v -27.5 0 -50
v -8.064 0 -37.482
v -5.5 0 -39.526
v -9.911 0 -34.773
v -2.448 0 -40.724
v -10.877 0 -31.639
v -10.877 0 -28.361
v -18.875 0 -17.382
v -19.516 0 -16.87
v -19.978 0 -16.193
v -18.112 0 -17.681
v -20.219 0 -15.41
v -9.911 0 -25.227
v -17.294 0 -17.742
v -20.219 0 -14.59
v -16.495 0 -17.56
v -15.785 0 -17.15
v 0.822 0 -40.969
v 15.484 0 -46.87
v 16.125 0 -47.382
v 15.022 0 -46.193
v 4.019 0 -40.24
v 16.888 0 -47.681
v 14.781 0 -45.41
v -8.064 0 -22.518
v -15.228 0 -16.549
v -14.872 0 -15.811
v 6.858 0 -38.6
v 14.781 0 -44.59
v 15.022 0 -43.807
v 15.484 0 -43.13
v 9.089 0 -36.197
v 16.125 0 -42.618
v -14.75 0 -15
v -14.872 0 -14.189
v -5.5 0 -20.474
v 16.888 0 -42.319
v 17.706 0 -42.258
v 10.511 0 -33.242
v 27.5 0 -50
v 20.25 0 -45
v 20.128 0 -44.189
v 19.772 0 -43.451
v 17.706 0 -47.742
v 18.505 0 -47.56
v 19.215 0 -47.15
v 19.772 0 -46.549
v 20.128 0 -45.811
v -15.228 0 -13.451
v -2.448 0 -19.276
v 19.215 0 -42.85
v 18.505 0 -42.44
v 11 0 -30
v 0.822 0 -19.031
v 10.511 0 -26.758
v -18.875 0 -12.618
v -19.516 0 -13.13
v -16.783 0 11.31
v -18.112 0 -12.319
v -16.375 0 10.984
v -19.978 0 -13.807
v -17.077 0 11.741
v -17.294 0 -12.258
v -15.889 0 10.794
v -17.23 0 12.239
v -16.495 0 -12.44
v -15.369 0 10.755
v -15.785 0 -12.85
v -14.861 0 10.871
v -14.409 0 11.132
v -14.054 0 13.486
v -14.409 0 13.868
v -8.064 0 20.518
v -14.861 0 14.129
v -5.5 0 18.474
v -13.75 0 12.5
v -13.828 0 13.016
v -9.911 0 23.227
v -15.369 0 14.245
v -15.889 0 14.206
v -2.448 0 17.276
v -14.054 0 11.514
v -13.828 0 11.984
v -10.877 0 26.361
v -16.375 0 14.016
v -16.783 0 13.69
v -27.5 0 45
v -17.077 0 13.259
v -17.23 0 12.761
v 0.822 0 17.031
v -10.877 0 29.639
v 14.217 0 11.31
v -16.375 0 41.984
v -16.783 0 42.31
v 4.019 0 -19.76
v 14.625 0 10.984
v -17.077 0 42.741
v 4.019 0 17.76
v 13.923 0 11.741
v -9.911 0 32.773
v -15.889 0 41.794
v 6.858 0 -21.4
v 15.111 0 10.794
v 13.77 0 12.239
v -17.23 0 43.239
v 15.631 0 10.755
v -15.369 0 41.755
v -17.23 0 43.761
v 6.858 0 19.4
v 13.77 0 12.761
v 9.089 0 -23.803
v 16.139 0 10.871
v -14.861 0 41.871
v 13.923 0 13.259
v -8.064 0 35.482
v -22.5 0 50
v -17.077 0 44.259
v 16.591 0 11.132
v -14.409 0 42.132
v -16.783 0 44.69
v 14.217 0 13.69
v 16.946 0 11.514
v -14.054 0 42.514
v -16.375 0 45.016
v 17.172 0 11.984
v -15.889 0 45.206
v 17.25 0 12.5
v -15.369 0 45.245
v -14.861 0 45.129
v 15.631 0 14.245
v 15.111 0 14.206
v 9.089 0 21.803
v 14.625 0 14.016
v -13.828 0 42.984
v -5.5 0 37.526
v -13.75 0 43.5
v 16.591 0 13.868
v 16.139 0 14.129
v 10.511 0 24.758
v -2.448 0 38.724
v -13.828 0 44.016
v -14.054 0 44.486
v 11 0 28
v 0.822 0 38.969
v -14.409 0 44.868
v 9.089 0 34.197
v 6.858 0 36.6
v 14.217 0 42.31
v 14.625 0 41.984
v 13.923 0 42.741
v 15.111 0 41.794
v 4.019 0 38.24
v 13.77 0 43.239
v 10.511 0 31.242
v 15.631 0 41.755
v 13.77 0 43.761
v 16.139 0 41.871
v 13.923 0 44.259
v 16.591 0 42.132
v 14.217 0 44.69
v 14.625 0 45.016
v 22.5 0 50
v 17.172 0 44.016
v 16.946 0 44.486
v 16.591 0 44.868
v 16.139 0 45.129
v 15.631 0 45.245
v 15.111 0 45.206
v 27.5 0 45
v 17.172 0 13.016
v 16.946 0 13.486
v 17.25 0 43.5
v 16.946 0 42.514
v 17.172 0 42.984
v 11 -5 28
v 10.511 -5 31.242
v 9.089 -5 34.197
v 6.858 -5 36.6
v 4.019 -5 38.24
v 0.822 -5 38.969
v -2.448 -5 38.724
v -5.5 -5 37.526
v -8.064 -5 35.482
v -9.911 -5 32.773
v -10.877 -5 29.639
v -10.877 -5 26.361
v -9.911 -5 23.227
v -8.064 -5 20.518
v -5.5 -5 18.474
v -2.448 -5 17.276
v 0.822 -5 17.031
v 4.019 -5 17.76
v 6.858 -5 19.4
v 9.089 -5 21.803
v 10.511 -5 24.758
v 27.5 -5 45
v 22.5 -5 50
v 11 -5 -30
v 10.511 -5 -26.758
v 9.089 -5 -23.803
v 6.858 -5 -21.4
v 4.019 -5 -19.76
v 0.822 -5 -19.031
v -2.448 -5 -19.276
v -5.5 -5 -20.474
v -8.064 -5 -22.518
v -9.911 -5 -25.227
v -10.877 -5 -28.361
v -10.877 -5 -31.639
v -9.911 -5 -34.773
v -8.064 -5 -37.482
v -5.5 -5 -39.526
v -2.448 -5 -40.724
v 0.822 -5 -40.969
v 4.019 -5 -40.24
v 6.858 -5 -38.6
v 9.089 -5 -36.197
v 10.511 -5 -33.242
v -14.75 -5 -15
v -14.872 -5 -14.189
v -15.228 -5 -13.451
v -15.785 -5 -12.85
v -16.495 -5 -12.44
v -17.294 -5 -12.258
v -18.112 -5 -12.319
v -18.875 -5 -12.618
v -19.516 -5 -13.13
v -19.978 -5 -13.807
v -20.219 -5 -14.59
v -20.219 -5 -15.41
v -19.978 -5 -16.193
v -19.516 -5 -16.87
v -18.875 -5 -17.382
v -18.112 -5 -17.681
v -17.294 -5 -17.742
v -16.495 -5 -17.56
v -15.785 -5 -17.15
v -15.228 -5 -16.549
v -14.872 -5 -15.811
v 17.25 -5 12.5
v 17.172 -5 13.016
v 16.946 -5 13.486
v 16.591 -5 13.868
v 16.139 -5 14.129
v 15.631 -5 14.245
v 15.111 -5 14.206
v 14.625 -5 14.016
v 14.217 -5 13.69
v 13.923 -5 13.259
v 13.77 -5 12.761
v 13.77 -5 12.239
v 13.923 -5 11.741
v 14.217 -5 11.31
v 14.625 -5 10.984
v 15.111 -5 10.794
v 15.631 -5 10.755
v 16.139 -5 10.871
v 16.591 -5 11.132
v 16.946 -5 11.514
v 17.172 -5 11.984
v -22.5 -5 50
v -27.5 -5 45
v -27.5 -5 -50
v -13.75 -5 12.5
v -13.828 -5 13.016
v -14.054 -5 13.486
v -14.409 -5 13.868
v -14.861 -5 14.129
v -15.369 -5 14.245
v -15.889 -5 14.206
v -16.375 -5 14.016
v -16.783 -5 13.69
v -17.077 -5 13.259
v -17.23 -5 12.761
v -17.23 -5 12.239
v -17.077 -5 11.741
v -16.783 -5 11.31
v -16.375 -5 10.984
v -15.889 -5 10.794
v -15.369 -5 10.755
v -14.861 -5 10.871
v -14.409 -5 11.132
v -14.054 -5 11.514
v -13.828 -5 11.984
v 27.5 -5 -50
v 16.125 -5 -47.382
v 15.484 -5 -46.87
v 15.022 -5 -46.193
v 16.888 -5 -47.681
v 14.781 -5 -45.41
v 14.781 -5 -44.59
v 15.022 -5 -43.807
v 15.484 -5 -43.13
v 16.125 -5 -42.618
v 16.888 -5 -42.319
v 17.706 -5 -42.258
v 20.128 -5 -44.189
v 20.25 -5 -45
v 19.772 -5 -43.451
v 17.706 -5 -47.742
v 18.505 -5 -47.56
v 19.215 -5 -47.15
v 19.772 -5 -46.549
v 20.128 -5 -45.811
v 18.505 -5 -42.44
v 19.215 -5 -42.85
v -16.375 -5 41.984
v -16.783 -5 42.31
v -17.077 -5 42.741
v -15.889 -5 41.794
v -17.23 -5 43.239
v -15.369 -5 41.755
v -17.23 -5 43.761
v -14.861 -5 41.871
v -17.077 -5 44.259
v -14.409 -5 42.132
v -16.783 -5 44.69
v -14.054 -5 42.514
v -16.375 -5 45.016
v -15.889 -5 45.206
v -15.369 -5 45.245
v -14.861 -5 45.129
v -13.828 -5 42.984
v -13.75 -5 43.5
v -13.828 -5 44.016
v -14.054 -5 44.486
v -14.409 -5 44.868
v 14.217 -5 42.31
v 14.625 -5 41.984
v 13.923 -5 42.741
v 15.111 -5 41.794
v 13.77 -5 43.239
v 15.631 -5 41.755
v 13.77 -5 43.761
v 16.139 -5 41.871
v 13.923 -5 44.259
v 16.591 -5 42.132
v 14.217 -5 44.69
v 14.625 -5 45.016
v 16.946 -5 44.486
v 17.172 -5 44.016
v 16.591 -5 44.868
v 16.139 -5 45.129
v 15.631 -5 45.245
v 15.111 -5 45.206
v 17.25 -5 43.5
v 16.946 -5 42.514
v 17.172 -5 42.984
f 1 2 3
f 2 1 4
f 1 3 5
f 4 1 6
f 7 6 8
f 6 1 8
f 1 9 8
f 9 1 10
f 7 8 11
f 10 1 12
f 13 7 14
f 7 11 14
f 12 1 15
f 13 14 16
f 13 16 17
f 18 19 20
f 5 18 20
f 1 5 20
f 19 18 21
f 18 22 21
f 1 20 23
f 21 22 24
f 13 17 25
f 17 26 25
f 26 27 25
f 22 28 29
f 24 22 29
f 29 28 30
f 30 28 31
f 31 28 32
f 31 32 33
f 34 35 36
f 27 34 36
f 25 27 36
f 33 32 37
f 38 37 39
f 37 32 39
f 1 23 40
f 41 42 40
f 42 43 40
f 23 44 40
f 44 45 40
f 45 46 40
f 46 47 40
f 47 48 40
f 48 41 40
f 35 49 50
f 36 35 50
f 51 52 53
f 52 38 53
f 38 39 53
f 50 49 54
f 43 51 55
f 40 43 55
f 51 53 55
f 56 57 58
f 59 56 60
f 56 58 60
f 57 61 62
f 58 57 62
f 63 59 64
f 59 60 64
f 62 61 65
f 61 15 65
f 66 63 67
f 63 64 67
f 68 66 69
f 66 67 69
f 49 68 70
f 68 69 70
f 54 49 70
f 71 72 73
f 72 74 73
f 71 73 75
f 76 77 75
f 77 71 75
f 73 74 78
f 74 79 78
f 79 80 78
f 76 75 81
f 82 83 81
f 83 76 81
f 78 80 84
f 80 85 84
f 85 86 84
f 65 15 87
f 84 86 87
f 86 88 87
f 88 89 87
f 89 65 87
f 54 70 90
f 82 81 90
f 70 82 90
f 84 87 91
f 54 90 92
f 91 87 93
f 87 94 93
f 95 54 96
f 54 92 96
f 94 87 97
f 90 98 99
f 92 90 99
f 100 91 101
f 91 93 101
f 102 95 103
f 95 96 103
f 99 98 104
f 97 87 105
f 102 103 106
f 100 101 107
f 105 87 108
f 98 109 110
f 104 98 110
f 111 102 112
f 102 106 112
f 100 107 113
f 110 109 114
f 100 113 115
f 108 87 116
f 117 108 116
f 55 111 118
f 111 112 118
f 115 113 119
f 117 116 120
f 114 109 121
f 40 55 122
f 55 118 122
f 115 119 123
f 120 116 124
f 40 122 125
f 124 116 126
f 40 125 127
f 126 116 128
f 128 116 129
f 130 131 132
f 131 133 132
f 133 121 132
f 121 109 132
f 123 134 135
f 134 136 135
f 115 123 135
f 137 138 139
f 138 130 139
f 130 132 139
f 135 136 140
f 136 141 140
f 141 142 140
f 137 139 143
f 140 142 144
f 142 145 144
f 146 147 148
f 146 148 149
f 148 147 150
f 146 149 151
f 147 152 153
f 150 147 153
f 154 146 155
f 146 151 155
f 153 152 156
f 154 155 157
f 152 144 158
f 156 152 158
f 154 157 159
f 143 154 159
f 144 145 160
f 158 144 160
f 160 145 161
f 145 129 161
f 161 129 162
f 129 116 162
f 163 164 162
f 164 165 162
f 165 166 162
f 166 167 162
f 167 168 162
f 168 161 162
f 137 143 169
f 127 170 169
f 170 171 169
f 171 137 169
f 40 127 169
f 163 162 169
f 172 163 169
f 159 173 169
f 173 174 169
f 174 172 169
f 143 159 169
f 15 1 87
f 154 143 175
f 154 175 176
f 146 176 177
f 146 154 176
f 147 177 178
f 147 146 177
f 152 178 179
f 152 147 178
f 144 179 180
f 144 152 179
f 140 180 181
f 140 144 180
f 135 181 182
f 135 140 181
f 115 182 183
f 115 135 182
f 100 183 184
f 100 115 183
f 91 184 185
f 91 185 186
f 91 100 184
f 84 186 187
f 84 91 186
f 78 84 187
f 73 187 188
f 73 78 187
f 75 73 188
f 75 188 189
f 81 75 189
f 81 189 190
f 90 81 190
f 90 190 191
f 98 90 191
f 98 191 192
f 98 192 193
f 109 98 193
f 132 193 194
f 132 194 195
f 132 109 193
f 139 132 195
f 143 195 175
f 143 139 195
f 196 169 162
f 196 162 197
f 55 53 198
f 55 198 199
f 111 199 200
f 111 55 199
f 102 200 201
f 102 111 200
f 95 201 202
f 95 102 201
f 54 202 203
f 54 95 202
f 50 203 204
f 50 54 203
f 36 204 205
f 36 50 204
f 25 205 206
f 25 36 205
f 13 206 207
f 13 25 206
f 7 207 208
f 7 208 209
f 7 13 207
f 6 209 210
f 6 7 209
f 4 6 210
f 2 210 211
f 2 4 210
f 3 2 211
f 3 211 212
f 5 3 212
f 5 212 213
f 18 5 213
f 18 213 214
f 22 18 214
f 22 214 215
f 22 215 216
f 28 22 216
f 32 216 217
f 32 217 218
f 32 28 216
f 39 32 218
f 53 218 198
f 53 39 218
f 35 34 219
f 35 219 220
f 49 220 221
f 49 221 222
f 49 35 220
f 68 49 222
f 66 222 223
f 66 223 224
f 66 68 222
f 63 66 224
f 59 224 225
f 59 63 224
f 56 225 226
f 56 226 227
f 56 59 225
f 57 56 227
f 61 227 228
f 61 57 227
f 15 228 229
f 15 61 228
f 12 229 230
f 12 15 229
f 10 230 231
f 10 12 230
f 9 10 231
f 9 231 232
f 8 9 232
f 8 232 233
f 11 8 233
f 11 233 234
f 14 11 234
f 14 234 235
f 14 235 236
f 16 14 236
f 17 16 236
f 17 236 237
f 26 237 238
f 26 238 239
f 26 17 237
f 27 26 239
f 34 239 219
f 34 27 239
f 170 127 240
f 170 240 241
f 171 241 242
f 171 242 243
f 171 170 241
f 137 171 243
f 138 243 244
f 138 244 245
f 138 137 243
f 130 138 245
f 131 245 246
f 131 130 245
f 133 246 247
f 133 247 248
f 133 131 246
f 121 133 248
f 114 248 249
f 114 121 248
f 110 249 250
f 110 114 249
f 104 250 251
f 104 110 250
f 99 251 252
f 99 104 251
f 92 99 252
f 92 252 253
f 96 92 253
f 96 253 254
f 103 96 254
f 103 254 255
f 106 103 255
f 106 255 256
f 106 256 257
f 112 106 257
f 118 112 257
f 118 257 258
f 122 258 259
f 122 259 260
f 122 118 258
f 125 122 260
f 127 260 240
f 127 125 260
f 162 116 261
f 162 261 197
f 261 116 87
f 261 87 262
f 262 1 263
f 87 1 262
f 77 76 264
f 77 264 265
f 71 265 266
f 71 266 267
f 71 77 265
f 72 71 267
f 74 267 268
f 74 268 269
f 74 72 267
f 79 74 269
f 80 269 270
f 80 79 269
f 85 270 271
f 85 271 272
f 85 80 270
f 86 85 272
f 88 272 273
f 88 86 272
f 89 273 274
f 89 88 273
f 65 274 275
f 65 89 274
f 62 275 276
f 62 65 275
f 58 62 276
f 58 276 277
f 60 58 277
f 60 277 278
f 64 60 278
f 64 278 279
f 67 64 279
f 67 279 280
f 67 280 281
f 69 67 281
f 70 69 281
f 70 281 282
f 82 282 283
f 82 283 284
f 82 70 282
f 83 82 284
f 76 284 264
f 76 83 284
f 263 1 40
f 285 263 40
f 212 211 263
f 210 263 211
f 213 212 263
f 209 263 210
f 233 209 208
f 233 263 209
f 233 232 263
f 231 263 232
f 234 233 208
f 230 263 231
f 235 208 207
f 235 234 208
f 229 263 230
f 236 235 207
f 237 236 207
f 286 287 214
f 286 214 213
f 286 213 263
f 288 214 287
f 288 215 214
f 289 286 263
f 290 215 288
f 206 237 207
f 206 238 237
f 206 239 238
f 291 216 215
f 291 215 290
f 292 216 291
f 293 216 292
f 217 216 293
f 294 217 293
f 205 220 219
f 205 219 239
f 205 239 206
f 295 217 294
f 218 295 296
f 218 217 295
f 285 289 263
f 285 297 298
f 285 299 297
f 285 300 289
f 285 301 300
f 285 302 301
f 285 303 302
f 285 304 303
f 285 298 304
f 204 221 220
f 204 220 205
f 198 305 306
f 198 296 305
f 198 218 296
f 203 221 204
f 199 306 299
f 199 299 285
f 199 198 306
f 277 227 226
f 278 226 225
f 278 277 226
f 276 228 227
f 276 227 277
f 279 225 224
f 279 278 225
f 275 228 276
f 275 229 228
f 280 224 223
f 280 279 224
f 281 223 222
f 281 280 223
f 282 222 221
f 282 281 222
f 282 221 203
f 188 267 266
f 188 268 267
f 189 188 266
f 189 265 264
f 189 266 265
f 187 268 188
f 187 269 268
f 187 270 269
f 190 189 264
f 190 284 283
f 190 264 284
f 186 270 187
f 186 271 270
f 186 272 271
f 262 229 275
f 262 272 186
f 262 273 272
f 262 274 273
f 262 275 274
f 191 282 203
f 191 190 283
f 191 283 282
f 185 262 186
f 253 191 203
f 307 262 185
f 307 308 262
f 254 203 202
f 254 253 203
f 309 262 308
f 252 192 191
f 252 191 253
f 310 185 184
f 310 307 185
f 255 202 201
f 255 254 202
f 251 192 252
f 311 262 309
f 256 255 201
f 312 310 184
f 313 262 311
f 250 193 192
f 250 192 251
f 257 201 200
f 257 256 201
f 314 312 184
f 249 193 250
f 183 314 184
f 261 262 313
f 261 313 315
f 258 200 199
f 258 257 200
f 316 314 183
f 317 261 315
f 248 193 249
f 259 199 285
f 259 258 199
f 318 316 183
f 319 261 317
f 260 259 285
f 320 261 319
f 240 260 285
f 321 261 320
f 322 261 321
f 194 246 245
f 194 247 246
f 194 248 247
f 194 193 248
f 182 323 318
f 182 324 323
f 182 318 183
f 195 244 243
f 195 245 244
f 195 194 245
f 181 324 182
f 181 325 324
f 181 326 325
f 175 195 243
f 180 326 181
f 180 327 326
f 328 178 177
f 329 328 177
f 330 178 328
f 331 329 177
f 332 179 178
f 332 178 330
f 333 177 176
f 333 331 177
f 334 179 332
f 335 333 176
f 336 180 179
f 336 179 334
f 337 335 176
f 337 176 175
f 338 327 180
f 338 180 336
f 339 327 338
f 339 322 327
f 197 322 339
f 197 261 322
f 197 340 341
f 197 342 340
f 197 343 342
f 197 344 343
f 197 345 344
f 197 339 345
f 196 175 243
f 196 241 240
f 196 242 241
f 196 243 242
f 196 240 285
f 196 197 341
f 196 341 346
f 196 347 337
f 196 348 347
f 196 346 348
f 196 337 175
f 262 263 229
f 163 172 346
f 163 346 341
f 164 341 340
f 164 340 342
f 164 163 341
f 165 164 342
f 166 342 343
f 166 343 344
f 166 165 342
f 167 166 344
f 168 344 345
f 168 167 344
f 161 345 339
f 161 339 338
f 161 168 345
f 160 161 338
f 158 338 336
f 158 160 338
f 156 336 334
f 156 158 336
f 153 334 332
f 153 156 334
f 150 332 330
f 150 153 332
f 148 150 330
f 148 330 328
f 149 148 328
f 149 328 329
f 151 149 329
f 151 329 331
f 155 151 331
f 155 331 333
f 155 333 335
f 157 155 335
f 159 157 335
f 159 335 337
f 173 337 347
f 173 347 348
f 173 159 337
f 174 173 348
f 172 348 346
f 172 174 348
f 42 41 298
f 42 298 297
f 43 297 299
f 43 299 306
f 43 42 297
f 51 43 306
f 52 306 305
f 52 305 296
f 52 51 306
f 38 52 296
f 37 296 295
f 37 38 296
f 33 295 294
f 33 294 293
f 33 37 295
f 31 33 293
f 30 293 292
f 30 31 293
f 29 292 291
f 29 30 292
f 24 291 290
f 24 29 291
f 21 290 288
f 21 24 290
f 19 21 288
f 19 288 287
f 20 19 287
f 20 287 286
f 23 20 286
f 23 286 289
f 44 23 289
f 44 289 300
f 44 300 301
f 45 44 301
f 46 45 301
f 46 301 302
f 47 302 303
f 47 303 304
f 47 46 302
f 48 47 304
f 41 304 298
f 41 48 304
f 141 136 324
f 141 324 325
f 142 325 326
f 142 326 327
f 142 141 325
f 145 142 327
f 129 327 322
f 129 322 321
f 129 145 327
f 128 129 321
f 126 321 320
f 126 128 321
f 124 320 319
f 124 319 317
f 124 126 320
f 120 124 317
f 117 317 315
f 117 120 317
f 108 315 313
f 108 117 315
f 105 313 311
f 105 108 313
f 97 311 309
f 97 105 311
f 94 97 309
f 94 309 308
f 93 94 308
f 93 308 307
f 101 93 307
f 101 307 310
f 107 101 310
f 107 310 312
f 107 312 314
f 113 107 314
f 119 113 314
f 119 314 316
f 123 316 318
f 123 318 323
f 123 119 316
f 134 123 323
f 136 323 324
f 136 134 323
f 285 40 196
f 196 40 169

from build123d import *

# Parameters (mm, degrees)
F0_W     = 55
F0_H     = 100
F0_R     = 2.75
F0_R_2   = 11
F0_R_3   = 1.75
F1_DEPTH = 5
F2_SIZE  = 5
F3_SIZE  = 5


with BuildPart() as f1:
    # F0 (on Front) → F1 (new body)
    with BuildSketch(Plane.XZ):
        Rectangle(F0_W, F0_H)
        with Locations((-17.5, -15)):
            Circle(F0_R, mode=Mode.SUBTRACT)
        with Locations((0, -30)):
            Circle(F0_R_2, mode=Mode.SUBTRACT)
        with Locations((17.5, -45)):
            Circle(F0_R, mode=Mode.SUBTRACT)
        with Locations((-15.5, 12.5)):
            Circle(F0_R_3, mode=Mode.SUBTRACT)
        with Locations((-15.5, 43.5)):
            Circle(F0_R_3, mode=Mode.SUBTRACT)
        with Locations((15.5, 12.5)):
            Circle(F0_R_3, mode=Mode.SUBTRACT)
        with Locations((0, 28)):
            Circle(F0_R_2, mode=Mode.SUBTRACT)
        with Locations((15.5, 43.5)):
            Circle(F0_R_3, mode=Mode.SUBTRACT)
    extrude(amount=F1_DEPTH)

    # F2
    f2_edges = [f1.edges().sort_by_distance(p)[0] for p in [
        (-27.5, -2.5, 50),
    ]]
    chamfer(f2_edges, length=F2_SIZE)

    # F3
    f3_edges = [f1.edges().sort_by_distance(p)[0] for p in [
        (27.5, -2.5, 50),
    ]]
    chamfer(f3_edges, length=F3_SIZE)


solid = f1.part
